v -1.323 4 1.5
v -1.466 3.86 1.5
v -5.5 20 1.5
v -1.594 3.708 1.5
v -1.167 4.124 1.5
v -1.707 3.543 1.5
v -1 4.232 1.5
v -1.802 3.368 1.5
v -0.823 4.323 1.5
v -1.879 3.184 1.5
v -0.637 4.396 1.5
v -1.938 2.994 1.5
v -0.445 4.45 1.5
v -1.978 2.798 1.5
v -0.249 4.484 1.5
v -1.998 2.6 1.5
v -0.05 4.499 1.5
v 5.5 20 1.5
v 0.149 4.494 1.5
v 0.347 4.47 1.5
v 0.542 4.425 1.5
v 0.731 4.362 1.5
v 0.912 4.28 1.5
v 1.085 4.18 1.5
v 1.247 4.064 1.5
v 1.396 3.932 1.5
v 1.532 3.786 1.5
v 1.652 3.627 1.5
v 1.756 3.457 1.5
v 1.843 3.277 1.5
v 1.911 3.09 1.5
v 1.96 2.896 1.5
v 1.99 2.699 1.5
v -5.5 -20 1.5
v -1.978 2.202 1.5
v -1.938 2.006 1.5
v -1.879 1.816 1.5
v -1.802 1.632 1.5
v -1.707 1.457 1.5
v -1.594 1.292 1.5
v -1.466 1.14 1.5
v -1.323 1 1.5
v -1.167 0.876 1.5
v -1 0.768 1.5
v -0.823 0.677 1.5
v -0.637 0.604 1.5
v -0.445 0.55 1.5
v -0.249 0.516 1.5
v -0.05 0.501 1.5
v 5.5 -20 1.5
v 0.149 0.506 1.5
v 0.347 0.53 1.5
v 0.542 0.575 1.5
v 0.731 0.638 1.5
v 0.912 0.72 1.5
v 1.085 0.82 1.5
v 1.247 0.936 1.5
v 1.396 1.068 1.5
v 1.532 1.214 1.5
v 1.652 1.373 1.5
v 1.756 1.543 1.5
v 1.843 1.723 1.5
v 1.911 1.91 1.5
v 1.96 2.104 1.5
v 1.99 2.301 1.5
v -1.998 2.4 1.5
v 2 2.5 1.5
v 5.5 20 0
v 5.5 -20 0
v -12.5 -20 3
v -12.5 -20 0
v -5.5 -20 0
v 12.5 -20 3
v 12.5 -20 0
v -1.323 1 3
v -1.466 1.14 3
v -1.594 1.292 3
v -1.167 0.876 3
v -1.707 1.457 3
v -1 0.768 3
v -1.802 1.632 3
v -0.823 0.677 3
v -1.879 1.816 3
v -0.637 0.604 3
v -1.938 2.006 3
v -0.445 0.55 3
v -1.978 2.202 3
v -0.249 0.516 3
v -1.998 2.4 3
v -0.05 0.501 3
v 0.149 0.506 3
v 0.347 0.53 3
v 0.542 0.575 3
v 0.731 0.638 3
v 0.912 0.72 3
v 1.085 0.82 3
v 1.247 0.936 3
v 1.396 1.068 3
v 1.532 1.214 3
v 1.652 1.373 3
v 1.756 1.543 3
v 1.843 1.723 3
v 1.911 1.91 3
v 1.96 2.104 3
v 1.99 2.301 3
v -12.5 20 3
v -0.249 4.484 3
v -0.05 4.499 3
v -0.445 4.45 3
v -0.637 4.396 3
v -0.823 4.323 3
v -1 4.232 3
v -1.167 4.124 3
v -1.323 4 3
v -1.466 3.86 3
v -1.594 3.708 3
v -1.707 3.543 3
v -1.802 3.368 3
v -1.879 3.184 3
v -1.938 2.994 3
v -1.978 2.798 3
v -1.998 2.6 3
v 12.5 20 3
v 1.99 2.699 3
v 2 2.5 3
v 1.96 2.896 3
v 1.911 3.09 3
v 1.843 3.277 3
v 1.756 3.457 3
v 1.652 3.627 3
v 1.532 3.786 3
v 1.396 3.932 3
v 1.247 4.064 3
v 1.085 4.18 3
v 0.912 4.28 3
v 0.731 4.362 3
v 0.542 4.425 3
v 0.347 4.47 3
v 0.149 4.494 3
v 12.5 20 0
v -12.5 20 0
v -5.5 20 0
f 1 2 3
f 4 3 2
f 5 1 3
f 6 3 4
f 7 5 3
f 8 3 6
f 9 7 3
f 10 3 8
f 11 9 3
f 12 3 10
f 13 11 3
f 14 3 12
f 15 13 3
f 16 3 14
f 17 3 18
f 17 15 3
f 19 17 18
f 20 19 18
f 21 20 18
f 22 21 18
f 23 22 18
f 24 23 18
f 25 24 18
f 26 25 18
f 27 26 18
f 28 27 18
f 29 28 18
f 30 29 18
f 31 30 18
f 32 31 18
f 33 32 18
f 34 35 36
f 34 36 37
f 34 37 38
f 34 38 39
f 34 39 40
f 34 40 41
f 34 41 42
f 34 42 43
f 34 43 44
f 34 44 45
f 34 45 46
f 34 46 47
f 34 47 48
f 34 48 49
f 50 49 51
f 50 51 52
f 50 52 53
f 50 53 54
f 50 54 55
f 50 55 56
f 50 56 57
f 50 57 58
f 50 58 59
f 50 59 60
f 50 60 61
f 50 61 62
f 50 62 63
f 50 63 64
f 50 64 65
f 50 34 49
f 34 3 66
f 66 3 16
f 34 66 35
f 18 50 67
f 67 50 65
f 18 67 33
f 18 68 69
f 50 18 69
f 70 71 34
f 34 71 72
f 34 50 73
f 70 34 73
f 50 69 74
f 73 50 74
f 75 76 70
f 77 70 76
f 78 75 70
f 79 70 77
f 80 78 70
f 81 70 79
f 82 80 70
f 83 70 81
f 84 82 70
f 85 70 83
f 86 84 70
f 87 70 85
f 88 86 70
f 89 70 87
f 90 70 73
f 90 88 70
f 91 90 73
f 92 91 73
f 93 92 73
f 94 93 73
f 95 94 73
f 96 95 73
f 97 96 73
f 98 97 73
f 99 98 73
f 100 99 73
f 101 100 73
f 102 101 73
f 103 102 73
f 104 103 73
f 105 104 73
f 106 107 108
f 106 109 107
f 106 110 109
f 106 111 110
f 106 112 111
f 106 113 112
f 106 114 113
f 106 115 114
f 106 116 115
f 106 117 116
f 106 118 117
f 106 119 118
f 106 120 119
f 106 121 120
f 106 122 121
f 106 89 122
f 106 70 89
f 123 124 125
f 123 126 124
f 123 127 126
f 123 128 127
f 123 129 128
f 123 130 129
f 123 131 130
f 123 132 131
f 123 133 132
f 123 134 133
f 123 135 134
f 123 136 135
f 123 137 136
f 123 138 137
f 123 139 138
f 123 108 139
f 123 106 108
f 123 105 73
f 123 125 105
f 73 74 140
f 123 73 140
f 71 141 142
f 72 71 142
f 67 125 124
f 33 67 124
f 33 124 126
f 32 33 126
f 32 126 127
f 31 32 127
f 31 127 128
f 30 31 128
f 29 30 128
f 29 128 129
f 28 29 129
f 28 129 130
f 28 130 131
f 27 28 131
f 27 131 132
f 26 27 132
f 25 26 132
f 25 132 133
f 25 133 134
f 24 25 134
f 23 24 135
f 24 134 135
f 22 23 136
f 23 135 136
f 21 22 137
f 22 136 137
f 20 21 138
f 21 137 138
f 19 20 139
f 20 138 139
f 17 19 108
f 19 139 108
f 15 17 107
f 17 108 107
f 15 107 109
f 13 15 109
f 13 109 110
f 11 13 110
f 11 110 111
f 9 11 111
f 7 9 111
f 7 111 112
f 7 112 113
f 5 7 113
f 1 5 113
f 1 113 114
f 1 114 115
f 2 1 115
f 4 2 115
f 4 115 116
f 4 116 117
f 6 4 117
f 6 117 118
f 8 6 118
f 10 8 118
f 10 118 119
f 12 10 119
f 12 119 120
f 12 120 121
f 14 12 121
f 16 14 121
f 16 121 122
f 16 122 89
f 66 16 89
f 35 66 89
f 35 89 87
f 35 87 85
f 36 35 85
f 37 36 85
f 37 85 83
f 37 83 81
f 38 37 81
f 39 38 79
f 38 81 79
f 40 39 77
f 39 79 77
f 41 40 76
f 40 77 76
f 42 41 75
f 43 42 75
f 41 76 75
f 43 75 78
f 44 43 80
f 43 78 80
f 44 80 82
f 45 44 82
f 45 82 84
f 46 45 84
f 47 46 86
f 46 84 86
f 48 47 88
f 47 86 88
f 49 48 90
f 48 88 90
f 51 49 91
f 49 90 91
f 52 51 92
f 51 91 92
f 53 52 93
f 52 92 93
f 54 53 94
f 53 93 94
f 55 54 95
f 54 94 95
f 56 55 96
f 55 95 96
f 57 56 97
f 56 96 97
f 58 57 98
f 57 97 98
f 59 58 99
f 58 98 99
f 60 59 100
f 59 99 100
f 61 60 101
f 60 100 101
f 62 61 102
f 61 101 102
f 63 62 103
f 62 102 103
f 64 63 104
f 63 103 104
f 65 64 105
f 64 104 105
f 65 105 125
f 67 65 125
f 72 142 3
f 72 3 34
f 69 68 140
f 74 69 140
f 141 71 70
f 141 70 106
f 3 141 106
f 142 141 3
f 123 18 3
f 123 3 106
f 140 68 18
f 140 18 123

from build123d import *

# Parameters (mm, degrees)
F0_W     = 25
F0_H     = 40
F1_DEPTH = 3
F2_W     = 11
F2_H     = 40
F3_DEPTH = 1.5
F4_R     = 2
F5_DEPTH = 3.001


with BuildPart() as f1:
    # F0 (on Top) → F1 (new body)
    with BuildSketch(Plane.XY):
        Rectangle(F0_W, F0_H)
    extrude(amount=F1_DEPTH)

    # F2 (on face) → F3 (cut)
    with BuildSketch(Plane(origin=(0, 0, 0), x_dir=(1, 0, 0), z_dir=(0, 0, -1))):
        Rectangle(F2_W, F2_H)
    extrude(amount=-F3_DEPTH, mode=Mode.SUBTRACT)

    # F4 (on face) → F5 (cut, through all)
    with BuildSketch(Plane.XY.offset(3)):
        with Locations((0, 2.5)):
            Circle(F4_R)
    extrude(amount=-F5_DEPTH, mode=Mode.SUBTRACT)


solid = f1.part
